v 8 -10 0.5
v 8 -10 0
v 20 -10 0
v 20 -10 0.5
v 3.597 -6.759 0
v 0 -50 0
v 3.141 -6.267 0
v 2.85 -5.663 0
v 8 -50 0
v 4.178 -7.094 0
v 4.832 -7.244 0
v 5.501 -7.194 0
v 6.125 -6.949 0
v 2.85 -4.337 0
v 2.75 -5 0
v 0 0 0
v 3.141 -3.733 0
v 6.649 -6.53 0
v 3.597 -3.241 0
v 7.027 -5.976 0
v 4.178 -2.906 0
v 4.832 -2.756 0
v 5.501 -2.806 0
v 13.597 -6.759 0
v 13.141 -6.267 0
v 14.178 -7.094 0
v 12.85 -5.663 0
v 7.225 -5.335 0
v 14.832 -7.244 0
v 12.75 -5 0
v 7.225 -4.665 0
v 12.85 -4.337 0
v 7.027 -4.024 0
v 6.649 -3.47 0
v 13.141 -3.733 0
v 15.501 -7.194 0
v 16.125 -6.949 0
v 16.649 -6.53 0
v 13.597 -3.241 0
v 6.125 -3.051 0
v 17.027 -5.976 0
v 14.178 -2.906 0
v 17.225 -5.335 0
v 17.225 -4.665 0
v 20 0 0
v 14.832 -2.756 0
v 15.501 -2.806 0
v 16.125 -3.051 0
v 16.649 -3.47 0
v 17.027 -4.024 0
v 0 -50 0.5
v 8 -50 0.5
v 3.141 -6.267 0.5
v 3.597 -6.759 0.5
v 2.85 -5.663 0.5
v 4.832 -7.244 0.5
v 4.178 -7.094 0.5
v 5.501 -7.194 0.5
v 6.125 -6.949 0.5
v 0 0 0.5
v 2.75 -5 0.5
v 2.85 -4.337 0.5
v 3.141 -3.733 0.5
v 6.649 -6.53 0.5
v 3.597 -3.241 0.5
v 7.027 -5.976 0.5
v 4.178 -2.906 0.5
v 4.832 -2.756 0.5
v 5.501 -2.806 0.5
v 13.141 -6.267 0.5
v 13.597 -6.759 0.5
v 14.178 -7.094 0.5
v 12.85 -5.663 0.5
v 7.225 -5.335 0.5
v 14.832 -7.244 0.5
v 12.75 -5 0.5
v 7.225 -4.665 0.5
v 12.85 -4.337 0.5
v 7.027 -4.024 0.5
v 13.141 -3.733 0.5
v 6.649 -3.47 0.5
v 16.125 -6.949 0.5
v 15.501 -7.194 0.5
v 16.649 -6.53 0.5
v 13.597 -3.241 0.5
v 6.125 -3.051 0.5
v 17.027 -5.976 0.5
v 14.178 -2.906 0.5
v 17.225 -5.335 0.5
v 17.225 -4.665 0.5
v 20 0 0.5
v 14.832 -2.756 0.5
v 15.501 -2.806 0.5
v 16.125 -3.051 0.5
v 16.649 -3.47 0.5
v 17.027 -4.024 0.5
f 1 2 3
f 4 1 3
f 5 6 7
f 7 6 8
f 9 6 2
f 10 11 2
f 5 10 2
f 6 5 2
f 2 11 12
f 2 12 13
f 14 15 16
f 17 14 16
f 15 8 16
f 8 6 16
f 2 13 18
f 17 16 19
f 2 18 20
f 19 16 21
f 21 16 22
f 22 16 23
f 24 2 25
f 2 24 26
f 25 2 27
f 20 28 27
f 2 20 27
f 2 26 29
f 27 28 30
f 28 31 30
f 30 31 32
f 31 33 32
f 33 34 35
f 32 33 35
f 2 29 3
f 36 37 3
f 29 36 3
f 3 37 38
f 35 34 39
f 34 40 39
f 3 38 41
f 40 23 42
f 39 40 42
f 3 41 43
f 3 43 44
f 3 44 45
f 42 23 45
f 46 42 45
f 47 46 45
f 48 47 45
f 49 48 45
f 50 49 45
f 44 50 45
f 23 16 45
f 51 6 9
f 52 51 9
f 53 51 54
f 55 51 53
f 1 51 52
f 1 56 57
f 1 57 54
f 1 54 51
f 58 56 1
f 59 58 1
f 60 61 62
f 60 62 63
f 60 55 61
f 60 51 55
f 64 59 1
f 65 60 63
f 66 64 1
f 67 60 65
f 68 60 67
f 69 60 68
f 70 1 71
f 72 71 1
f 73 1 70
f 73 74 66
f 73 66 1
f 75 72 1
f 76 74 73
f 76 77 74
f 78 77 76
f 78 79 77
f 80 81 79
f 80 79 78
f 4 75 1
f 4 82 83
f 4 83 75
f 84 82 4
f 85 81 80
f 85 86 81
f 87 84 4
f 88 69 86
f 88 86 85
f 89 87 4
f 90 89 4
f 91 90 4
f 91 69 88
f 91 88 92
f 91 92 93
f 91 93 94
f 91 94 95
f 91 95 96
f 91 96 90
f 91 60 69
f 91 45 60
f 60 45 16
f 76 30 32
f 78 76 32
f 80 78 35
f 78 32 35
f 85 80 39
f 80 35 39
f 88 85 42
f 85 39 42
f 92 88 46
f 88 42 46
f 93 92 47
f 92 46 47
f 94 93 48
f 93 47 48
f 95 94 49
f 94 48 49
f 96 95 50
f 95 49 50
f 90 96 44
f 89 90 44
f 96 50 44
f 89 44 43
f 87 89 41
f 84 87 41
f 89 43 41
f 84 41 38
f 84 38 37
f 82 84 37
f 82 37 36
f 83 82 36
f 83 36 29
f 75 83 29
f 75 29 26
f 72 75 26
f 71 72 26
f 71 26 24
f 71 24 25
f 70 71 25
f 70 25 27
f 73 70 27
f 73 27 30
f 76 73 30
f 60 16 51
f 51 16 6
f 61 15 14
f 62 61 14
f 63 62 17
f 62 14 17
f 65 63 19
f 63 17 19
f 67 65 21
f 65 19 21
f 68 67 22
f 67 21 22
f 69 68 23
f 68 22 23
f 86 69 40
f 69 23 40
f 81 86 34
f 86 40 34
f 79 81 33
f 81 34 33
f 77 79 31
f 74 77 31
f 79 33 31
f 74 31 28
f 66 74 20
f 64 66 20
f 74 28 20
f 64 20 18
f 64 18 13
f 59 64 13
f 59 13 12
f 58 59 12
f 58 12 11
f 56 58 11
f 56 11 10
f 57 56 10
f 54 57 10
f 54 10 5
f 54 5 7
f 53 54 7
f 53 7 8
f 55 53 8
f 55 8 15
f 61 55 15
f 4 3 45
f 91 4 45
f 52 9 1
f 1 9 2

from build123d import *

# Parameters (mm, degrees)
ESQUISSE1_R          = 1.25
BOSS_EXTRU_1_DEPTH   = 0.5
D_GAGEMENT_M41_D     = 4.5
D_GAGEMENT_M41_DEPTH = 16


with BuildPart() as part:
    # Esquisse1 → Boss.-Extru.1 (new body)
    with BuildSketch(Plane.XY):
        Polygon((0, 0), (0, -50), (8, -50), (8, -10), (20, -10), (20, 0), align=None)
        with Locations((15, -5)):
            Circle(ESQUISSE1_R, mode=Mode.SUBTRACT)
        with Locations((5, -5)):
            Circle(ESQUISSE1_R, mode=Mode.SUBTRACT)
    extrude(amount=BOSS_EXTRU_1_DEPTH)

    # Dégagement M41
    with Locations(Plane.XY.offset(0.5)):
        with Locations((5, -5), (15, -5)):
            Hole(D_GAGEMENT_M41_D / 2, depth=D_GAGEMENT_M41_DEPTH)


solid = part.part
